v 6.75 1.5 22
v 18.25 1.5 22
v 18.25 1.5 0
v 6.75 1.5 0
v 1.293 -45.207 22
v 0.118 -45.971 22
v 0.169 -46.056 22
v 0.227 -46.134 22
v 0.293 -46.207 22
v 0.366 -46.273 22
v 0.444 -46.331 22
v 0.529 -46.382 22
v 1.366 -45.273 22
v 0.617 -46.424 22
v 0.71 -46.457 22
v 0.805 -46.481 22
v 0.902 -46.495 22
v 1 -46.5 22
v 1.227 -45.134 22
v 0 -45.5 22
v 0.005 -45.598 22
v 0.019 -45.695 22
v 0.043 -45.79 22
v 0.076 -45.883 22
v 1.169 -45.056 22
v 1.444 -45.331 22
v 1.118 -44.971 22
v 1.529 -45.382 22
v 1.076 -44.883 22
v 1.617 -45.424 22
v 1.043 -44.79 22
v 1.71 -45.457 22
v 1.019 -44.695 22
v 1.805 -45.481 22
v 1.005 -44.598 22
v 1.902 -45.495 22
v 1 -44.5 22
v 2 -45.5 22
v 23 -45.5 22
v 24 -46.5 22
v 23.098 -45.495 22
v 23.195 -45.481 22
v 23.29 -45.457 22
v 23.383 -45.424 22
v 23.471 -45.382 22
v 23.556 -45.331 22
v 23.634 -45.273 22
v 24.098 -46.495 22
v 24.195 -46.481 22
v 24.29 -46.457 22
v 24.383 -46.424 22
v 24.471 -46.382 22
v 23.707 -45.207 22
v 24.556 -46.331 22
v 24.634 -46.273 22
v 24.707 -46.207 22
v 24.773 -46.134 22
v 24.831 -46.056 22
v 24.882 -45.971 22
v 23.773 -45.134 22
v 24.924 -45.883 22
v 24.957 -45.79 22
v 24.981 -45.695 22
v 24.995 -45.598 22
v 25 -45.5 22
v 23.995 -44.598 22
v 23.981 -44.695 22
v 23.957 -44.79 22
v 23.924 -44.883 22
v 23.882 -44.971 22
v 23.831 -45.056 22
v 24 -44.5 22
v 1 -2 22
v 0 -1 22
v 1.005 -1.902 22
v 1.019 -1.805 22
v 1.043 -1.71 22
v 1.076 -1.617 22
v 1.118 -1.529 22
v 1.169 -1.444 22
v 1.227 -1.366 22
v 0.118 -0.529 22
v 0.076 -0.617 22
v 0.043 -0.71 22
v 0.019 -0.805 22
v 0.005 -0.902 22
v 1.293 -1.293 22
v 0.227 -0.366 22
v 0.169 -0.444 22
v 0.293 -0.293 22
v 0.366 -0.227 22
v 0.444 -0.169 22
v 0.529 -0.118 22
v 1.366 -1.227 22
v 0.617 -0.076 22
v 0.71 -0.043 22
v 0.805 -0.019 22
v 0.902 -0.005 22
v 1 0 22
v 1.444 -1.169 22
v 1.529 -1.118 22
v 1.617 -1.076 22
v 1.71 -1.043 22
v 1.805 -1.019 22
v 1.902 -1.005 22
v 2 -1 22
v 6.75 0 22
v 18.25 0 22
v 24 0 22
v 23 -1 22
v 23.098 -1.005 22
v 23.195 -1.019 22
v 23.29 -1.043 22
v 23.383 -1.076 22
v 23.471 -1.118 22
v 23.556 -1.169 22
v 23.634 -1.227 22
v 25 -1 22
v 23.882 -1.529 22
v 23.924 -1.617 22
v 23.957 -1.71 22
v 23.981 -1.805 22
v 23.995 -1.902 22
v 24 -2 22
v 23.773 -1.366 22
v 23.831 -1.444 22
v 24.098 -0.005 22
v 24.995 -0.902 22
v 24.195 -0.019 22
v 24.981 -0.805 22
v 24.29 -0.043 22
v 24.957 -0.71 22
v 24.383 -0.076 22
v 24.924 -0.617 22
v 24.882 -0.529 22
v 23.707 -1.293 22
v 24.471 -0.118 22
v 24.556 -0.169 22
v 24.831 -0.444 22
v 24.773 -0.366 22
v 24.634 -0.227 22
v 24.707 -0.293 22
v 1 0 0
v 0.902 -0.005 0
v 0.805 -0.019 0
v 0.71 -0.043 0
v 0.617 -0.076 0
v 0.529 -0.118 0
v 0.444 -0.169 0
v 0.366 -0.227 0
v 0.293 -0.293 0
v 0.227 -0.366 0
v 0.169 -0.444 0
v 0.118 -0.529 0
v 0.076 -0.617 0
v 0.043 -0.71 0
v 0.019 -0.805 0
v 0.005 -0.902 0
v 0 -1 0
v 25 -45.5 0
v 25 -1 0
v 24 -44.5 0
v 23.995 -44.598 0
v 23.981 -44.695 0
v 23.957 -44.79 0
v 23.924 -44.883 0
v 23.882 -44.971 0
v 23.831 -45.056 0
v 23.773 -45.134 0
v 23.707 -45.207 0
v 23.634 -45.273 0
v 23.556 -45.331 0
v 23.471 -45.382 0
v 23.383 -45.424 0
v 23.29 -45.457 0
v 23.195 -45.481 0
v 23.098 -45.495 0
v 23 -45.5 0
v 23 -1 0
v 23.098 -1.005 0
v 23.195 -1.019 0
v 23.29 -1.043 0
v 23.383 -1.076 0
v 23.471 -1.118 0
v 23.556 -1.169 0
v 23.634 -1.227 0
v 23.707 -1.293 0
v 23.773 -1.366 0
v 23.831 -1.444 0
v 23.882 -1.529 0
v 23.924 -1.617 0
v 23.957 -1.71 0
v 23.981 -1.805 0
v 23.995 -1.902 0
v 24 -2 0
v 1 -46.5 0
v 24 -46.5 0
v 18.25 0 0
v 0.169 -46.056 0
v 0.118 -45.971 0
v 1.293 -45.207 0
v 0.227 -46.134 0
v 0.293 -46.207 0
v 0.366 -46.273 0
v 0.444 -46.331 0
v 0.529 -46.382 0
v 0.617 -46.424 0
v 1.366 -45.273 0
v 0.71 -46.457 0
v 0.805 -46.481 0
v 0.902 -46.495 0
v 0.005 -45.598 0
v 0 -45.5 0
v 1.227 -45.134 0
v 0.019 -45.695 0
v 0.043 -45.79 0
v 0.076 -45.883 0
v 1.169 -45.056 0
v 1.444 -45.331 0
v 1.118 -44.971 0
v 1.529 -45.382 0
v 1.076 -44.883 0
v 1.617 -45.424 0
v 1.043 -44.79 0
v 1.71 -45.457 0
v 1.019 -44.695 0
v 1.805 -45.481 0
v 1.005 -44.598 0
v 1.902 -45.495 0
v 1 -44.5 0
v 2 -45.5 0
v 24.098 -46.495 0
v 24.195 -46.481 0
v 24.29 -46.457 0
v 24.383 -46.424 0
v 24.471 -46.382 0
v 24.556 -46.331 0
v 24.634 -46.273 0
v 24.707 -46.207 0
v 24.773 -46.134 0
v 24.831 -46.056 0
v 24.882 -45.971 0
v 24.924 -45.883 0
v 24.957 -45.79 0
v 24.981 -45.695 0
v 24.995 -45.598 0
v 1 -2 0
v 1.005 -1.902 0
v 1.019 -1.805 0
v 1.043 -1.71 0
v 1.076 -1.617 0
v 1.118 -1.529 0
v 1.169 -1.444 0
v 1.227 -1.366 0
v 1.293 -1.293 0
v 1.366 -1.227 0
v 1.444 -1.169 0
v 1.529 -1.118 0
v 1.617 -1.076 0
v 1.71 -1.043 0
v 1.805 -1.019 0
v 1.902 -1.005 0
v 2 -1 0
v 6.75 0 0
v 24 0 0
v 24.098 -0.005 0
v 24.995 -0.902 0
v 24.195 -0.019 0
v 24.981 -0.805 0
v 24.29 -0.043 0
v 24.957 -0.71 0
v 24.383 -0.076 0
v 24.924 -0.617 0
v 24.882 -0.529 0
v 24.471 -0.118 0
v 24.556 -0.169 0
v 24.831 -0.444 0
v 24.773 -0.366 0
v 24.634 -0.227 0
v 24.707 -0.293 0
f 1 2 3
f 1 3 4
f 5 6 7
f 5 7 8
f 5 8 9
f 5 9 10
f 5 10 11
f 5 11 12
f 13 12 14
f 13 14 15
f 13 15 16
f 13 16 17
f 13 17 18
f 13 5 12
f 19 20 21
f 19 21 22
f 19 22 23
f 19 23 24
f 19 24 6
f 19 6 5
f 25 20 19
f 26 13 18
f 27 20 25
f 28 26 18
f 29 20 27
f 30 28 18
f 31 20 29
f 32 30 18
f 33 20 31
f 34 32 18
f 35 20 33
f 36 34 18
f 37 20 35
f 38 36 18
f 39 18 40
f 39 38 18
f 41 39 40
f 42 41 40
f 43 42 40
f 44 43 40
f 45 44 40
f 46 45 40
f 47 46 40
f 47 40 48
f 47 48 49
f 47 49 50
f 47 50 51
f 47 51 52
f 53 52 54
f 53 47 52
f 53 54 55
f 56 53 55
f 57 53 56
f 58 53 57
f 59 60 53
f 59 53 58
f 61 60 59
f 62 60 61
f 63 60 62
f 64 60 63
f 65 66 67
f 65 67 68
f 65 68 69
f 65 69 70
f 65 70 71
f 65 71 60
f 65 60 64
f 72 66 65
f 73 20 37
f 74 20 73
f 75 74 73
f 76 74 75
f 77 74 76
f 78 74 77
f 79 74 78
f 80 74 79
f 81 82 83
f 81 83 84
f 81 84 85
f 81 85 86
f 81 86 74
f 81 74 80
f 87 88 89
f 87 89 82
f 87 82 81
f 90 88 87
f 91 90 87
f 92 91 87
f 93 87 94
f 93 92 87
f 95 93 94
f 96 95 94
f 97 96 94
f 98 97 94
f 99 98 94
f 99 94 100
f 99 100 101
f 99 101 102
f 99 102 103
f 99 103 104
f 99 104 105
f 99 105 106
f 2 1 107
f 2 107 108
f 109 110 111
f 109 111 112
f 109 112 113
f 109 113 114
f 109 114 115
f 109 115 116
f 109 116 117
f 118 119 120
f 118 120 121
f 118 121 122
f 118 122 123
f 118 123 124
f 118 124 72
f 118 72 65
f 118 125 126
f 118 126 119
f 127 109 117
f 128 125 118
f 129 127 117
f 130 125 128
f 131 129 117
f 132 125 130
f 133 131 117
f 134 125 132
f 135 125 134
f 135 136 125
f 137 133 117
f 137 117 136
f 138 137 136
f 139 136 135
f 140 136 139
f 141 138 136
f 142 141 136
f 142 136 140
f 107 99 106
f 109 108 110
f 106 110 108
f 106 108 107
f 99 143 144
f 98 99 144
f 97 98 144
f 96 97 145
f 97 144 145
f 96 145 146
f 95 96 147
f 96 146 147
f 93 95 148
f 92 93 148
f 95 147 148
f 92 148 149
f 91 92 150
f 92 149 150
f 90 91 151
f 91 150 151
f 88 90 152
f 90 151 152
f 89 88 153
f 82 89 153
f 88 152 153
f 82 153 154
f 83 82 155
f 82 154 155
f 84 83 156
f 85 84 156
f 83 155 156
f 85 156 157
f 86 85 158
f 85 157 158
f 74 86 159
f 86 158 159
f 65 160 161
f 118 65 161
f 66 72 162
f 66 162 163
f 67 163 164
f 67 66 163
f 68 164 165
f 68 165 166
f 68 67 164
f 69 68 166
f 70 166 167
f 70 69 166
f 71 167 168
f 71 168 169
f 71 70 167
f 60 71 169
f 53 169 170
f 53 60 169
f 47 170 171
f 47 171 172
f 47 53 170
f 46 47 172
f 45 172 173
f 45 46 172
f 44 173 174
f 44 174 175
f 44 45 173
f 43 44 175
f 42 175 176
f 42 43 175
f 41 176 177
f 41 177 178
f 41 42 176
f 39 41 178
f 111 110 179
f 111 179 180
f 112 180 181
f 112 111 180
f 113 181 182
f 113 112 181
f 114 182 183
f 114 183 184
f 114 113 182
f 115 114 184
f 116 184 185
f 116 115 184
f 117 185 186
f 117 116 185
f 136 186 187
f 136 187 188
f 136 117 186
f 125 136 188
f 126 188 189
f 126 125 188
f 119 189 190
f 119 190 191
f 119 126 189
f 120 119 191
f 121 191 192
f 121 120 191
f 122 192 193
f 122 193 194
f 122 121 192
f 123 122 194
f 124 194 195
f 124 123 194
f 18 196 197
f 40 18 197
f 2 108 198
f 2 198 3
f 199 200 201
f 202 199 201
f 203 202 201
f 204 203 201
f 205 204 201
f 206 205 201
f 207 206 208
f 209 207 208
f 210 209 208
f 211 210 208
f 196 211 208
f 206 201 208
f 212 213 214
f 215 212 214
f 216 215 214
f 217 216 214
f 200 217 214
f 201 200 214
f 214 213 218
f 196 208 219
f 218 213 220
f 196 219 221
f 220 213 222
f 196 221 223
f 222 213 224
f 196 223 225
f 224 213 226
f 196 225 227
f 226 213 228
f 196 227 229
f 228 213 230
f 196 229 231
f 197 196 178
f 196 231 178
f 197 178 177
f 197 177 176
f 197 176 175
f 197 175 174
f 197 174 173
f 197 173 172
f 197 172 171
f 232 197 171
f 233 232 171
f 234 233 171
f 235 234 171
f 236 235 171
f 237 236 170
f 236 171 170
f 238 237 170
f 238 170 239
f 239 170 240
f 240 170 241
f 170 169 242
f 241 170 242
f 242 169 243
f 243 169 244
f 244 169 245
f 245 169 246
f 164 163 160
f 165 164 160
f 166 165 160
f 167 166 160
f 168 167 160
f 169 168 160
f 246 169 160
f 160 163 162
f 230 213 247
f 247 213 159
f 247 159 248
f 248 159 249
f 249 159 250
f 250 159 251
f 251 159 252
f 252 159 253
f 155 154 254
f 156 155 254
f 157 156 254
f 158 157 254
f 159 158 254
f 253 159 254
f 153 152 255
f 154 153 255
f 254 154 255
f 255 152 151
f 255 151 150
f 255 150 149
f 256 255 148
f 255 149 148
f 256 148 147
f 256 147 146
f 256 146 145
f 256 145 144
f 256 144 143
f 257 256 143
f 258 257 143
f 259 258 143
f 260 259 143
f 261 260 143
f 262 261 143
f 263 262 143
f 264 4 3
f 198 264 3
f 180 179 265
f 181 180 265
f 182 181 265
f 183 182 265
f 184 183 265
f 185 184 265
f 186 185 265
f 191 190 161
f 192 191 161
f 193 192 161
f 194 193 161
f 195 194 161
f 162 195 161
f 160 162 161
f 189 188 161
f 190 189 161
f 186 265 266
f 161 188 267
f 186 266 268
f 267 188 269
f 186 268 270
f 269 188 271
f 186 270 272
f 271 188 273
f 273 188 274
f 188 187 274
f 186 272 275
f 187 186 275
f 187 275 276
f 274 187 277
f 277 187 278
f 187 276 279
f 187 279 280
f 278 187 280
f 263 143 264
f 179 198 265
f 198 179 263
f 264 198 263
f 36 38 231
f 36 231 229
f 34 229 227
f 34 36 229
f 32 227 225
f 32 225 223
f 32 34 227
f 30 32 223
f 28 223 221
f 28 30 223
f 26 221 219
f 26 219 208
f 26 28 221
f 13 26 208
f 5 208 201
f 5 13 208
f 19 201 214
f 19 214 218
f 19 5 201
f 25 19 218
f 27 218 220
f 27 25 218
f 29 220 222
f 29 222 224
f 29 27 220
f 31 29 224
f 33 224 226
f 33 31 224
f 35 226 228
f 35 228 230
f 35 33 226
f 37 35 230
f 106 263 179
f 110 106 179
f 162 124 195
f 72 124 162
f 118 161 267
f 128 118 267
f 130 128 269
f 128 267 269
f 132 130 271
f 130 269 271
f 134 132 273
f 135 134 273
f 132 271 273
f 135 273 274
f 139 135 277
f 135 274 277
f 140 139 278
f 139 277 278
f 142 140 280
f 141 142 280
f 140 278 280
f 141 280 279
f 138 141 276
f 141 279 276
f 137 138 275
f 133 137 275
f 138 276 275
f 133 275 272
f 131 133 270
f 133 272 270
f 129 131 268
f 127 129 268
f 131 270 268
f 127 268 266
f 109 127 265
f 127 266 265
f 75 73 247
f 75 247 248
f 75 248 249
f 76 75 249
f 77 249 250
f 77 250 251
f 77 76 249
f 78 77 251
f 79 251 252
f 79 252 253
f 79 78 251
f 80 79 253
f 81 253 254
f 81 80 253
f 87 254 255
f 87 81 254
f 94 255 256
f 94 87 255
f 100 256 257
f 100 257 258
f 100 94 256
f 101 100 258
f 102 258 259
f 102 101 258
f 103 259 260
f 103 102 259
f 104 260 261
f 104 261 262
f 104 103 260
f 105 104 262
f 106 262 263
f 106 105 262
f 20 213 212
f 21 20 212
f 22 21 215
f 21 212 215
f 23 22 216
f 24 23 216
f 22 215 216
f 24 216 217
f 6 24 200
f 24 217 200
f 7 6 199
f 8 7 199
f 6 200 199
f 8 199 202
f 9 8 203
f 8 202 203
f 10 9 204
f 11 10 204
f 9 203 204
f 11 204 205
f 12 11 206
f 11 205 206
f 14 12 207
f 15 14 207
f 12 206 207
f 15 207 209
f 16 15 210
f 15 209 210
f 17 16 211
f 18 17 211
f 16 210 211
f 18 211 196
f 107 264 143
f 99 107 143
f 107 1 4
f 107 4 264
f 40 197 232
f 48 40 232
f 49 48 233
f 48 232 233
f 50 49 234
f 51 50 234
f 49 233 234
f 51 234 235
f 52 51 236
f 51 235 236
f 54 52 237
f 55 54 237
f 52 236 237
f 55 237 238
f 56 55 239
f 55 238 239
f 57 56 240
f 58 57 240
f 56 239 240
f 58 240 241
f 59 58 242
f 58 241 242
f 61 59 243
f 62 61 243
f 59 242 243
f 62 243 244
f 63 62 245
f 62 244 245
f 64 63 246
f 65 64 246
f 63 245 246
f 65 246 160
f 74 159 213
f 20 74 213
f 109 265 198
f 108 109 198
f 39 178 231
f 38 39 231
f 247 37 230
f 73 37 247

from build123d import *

# Parameters (mm, degrees)
BOSS_EXTRUDE1_DEPTH = 22
CUT_EXTRUDE1_DEPTH  = 22


with BuildPart() as part:
    # Sketch1 → Boss-Extrude1 (new body)
    with BuildSketch(Plane.XY):
        with BuildLine():
            Line((6.75, 1.5), (6.75, 0))
            Line((6.75, 0), (1, 0))
            ThreePointArc((1, 0), (0.292893219, -0.292893219), (0, -1))
            Line((0, -1), (0, -45.5))
            ThreePointArc((0, -45.5), (0.292893219, -46.207106781), (1, -46.5))
            Line((1, -46.5), (24, -46.5))
            ThreePointArc((24, -46.5), (24.707106781, -46.207106781), (25, -45.5))
            Line((25, -45.5), (25, -1))
            ThreePointArc((25, -1), (24.707106781, -0.292893219), (24, 0))
            Line((24, 0), (18.25, 0))
            Line((18.25, 0), (18.25, 1.5))
            Line((18.25, 1.5), (6.75, 1.5))
        make_face()
    extrude(amount=BOSS_EXTRUDE1_DEPTH)

    # Sketch2 → Cut-Extrude1 (cut)
    with BuildSketch(Plane.XY.offset(22)):
        with BuildLine():
            Line((2, -1), (23, -1))
            ThreePointArc((23, -1), (23.707106781, -1.292893219), (24, -2))
            Line((24, -2), (24, -44.5))
            ThreePointArc((24, -44.5), (23.707106781, -45.207106781), (23, -45.5))
            Line((23, -45.5), (2, -45.5))
            ThreePointArc((2, -45.5), (1.292893219, -45.207106781), (1, -44.5))
            Line((1, -44.5), (1, -2))
            ThreePointArc((1, -2), (1.292893219, -1.292893219), (2, -1))
        make_face()
    extrude(amount=-CUT_EXTRUDE1_DEPTH, mode=Mode.SUBTRACT)


solid = part.part
